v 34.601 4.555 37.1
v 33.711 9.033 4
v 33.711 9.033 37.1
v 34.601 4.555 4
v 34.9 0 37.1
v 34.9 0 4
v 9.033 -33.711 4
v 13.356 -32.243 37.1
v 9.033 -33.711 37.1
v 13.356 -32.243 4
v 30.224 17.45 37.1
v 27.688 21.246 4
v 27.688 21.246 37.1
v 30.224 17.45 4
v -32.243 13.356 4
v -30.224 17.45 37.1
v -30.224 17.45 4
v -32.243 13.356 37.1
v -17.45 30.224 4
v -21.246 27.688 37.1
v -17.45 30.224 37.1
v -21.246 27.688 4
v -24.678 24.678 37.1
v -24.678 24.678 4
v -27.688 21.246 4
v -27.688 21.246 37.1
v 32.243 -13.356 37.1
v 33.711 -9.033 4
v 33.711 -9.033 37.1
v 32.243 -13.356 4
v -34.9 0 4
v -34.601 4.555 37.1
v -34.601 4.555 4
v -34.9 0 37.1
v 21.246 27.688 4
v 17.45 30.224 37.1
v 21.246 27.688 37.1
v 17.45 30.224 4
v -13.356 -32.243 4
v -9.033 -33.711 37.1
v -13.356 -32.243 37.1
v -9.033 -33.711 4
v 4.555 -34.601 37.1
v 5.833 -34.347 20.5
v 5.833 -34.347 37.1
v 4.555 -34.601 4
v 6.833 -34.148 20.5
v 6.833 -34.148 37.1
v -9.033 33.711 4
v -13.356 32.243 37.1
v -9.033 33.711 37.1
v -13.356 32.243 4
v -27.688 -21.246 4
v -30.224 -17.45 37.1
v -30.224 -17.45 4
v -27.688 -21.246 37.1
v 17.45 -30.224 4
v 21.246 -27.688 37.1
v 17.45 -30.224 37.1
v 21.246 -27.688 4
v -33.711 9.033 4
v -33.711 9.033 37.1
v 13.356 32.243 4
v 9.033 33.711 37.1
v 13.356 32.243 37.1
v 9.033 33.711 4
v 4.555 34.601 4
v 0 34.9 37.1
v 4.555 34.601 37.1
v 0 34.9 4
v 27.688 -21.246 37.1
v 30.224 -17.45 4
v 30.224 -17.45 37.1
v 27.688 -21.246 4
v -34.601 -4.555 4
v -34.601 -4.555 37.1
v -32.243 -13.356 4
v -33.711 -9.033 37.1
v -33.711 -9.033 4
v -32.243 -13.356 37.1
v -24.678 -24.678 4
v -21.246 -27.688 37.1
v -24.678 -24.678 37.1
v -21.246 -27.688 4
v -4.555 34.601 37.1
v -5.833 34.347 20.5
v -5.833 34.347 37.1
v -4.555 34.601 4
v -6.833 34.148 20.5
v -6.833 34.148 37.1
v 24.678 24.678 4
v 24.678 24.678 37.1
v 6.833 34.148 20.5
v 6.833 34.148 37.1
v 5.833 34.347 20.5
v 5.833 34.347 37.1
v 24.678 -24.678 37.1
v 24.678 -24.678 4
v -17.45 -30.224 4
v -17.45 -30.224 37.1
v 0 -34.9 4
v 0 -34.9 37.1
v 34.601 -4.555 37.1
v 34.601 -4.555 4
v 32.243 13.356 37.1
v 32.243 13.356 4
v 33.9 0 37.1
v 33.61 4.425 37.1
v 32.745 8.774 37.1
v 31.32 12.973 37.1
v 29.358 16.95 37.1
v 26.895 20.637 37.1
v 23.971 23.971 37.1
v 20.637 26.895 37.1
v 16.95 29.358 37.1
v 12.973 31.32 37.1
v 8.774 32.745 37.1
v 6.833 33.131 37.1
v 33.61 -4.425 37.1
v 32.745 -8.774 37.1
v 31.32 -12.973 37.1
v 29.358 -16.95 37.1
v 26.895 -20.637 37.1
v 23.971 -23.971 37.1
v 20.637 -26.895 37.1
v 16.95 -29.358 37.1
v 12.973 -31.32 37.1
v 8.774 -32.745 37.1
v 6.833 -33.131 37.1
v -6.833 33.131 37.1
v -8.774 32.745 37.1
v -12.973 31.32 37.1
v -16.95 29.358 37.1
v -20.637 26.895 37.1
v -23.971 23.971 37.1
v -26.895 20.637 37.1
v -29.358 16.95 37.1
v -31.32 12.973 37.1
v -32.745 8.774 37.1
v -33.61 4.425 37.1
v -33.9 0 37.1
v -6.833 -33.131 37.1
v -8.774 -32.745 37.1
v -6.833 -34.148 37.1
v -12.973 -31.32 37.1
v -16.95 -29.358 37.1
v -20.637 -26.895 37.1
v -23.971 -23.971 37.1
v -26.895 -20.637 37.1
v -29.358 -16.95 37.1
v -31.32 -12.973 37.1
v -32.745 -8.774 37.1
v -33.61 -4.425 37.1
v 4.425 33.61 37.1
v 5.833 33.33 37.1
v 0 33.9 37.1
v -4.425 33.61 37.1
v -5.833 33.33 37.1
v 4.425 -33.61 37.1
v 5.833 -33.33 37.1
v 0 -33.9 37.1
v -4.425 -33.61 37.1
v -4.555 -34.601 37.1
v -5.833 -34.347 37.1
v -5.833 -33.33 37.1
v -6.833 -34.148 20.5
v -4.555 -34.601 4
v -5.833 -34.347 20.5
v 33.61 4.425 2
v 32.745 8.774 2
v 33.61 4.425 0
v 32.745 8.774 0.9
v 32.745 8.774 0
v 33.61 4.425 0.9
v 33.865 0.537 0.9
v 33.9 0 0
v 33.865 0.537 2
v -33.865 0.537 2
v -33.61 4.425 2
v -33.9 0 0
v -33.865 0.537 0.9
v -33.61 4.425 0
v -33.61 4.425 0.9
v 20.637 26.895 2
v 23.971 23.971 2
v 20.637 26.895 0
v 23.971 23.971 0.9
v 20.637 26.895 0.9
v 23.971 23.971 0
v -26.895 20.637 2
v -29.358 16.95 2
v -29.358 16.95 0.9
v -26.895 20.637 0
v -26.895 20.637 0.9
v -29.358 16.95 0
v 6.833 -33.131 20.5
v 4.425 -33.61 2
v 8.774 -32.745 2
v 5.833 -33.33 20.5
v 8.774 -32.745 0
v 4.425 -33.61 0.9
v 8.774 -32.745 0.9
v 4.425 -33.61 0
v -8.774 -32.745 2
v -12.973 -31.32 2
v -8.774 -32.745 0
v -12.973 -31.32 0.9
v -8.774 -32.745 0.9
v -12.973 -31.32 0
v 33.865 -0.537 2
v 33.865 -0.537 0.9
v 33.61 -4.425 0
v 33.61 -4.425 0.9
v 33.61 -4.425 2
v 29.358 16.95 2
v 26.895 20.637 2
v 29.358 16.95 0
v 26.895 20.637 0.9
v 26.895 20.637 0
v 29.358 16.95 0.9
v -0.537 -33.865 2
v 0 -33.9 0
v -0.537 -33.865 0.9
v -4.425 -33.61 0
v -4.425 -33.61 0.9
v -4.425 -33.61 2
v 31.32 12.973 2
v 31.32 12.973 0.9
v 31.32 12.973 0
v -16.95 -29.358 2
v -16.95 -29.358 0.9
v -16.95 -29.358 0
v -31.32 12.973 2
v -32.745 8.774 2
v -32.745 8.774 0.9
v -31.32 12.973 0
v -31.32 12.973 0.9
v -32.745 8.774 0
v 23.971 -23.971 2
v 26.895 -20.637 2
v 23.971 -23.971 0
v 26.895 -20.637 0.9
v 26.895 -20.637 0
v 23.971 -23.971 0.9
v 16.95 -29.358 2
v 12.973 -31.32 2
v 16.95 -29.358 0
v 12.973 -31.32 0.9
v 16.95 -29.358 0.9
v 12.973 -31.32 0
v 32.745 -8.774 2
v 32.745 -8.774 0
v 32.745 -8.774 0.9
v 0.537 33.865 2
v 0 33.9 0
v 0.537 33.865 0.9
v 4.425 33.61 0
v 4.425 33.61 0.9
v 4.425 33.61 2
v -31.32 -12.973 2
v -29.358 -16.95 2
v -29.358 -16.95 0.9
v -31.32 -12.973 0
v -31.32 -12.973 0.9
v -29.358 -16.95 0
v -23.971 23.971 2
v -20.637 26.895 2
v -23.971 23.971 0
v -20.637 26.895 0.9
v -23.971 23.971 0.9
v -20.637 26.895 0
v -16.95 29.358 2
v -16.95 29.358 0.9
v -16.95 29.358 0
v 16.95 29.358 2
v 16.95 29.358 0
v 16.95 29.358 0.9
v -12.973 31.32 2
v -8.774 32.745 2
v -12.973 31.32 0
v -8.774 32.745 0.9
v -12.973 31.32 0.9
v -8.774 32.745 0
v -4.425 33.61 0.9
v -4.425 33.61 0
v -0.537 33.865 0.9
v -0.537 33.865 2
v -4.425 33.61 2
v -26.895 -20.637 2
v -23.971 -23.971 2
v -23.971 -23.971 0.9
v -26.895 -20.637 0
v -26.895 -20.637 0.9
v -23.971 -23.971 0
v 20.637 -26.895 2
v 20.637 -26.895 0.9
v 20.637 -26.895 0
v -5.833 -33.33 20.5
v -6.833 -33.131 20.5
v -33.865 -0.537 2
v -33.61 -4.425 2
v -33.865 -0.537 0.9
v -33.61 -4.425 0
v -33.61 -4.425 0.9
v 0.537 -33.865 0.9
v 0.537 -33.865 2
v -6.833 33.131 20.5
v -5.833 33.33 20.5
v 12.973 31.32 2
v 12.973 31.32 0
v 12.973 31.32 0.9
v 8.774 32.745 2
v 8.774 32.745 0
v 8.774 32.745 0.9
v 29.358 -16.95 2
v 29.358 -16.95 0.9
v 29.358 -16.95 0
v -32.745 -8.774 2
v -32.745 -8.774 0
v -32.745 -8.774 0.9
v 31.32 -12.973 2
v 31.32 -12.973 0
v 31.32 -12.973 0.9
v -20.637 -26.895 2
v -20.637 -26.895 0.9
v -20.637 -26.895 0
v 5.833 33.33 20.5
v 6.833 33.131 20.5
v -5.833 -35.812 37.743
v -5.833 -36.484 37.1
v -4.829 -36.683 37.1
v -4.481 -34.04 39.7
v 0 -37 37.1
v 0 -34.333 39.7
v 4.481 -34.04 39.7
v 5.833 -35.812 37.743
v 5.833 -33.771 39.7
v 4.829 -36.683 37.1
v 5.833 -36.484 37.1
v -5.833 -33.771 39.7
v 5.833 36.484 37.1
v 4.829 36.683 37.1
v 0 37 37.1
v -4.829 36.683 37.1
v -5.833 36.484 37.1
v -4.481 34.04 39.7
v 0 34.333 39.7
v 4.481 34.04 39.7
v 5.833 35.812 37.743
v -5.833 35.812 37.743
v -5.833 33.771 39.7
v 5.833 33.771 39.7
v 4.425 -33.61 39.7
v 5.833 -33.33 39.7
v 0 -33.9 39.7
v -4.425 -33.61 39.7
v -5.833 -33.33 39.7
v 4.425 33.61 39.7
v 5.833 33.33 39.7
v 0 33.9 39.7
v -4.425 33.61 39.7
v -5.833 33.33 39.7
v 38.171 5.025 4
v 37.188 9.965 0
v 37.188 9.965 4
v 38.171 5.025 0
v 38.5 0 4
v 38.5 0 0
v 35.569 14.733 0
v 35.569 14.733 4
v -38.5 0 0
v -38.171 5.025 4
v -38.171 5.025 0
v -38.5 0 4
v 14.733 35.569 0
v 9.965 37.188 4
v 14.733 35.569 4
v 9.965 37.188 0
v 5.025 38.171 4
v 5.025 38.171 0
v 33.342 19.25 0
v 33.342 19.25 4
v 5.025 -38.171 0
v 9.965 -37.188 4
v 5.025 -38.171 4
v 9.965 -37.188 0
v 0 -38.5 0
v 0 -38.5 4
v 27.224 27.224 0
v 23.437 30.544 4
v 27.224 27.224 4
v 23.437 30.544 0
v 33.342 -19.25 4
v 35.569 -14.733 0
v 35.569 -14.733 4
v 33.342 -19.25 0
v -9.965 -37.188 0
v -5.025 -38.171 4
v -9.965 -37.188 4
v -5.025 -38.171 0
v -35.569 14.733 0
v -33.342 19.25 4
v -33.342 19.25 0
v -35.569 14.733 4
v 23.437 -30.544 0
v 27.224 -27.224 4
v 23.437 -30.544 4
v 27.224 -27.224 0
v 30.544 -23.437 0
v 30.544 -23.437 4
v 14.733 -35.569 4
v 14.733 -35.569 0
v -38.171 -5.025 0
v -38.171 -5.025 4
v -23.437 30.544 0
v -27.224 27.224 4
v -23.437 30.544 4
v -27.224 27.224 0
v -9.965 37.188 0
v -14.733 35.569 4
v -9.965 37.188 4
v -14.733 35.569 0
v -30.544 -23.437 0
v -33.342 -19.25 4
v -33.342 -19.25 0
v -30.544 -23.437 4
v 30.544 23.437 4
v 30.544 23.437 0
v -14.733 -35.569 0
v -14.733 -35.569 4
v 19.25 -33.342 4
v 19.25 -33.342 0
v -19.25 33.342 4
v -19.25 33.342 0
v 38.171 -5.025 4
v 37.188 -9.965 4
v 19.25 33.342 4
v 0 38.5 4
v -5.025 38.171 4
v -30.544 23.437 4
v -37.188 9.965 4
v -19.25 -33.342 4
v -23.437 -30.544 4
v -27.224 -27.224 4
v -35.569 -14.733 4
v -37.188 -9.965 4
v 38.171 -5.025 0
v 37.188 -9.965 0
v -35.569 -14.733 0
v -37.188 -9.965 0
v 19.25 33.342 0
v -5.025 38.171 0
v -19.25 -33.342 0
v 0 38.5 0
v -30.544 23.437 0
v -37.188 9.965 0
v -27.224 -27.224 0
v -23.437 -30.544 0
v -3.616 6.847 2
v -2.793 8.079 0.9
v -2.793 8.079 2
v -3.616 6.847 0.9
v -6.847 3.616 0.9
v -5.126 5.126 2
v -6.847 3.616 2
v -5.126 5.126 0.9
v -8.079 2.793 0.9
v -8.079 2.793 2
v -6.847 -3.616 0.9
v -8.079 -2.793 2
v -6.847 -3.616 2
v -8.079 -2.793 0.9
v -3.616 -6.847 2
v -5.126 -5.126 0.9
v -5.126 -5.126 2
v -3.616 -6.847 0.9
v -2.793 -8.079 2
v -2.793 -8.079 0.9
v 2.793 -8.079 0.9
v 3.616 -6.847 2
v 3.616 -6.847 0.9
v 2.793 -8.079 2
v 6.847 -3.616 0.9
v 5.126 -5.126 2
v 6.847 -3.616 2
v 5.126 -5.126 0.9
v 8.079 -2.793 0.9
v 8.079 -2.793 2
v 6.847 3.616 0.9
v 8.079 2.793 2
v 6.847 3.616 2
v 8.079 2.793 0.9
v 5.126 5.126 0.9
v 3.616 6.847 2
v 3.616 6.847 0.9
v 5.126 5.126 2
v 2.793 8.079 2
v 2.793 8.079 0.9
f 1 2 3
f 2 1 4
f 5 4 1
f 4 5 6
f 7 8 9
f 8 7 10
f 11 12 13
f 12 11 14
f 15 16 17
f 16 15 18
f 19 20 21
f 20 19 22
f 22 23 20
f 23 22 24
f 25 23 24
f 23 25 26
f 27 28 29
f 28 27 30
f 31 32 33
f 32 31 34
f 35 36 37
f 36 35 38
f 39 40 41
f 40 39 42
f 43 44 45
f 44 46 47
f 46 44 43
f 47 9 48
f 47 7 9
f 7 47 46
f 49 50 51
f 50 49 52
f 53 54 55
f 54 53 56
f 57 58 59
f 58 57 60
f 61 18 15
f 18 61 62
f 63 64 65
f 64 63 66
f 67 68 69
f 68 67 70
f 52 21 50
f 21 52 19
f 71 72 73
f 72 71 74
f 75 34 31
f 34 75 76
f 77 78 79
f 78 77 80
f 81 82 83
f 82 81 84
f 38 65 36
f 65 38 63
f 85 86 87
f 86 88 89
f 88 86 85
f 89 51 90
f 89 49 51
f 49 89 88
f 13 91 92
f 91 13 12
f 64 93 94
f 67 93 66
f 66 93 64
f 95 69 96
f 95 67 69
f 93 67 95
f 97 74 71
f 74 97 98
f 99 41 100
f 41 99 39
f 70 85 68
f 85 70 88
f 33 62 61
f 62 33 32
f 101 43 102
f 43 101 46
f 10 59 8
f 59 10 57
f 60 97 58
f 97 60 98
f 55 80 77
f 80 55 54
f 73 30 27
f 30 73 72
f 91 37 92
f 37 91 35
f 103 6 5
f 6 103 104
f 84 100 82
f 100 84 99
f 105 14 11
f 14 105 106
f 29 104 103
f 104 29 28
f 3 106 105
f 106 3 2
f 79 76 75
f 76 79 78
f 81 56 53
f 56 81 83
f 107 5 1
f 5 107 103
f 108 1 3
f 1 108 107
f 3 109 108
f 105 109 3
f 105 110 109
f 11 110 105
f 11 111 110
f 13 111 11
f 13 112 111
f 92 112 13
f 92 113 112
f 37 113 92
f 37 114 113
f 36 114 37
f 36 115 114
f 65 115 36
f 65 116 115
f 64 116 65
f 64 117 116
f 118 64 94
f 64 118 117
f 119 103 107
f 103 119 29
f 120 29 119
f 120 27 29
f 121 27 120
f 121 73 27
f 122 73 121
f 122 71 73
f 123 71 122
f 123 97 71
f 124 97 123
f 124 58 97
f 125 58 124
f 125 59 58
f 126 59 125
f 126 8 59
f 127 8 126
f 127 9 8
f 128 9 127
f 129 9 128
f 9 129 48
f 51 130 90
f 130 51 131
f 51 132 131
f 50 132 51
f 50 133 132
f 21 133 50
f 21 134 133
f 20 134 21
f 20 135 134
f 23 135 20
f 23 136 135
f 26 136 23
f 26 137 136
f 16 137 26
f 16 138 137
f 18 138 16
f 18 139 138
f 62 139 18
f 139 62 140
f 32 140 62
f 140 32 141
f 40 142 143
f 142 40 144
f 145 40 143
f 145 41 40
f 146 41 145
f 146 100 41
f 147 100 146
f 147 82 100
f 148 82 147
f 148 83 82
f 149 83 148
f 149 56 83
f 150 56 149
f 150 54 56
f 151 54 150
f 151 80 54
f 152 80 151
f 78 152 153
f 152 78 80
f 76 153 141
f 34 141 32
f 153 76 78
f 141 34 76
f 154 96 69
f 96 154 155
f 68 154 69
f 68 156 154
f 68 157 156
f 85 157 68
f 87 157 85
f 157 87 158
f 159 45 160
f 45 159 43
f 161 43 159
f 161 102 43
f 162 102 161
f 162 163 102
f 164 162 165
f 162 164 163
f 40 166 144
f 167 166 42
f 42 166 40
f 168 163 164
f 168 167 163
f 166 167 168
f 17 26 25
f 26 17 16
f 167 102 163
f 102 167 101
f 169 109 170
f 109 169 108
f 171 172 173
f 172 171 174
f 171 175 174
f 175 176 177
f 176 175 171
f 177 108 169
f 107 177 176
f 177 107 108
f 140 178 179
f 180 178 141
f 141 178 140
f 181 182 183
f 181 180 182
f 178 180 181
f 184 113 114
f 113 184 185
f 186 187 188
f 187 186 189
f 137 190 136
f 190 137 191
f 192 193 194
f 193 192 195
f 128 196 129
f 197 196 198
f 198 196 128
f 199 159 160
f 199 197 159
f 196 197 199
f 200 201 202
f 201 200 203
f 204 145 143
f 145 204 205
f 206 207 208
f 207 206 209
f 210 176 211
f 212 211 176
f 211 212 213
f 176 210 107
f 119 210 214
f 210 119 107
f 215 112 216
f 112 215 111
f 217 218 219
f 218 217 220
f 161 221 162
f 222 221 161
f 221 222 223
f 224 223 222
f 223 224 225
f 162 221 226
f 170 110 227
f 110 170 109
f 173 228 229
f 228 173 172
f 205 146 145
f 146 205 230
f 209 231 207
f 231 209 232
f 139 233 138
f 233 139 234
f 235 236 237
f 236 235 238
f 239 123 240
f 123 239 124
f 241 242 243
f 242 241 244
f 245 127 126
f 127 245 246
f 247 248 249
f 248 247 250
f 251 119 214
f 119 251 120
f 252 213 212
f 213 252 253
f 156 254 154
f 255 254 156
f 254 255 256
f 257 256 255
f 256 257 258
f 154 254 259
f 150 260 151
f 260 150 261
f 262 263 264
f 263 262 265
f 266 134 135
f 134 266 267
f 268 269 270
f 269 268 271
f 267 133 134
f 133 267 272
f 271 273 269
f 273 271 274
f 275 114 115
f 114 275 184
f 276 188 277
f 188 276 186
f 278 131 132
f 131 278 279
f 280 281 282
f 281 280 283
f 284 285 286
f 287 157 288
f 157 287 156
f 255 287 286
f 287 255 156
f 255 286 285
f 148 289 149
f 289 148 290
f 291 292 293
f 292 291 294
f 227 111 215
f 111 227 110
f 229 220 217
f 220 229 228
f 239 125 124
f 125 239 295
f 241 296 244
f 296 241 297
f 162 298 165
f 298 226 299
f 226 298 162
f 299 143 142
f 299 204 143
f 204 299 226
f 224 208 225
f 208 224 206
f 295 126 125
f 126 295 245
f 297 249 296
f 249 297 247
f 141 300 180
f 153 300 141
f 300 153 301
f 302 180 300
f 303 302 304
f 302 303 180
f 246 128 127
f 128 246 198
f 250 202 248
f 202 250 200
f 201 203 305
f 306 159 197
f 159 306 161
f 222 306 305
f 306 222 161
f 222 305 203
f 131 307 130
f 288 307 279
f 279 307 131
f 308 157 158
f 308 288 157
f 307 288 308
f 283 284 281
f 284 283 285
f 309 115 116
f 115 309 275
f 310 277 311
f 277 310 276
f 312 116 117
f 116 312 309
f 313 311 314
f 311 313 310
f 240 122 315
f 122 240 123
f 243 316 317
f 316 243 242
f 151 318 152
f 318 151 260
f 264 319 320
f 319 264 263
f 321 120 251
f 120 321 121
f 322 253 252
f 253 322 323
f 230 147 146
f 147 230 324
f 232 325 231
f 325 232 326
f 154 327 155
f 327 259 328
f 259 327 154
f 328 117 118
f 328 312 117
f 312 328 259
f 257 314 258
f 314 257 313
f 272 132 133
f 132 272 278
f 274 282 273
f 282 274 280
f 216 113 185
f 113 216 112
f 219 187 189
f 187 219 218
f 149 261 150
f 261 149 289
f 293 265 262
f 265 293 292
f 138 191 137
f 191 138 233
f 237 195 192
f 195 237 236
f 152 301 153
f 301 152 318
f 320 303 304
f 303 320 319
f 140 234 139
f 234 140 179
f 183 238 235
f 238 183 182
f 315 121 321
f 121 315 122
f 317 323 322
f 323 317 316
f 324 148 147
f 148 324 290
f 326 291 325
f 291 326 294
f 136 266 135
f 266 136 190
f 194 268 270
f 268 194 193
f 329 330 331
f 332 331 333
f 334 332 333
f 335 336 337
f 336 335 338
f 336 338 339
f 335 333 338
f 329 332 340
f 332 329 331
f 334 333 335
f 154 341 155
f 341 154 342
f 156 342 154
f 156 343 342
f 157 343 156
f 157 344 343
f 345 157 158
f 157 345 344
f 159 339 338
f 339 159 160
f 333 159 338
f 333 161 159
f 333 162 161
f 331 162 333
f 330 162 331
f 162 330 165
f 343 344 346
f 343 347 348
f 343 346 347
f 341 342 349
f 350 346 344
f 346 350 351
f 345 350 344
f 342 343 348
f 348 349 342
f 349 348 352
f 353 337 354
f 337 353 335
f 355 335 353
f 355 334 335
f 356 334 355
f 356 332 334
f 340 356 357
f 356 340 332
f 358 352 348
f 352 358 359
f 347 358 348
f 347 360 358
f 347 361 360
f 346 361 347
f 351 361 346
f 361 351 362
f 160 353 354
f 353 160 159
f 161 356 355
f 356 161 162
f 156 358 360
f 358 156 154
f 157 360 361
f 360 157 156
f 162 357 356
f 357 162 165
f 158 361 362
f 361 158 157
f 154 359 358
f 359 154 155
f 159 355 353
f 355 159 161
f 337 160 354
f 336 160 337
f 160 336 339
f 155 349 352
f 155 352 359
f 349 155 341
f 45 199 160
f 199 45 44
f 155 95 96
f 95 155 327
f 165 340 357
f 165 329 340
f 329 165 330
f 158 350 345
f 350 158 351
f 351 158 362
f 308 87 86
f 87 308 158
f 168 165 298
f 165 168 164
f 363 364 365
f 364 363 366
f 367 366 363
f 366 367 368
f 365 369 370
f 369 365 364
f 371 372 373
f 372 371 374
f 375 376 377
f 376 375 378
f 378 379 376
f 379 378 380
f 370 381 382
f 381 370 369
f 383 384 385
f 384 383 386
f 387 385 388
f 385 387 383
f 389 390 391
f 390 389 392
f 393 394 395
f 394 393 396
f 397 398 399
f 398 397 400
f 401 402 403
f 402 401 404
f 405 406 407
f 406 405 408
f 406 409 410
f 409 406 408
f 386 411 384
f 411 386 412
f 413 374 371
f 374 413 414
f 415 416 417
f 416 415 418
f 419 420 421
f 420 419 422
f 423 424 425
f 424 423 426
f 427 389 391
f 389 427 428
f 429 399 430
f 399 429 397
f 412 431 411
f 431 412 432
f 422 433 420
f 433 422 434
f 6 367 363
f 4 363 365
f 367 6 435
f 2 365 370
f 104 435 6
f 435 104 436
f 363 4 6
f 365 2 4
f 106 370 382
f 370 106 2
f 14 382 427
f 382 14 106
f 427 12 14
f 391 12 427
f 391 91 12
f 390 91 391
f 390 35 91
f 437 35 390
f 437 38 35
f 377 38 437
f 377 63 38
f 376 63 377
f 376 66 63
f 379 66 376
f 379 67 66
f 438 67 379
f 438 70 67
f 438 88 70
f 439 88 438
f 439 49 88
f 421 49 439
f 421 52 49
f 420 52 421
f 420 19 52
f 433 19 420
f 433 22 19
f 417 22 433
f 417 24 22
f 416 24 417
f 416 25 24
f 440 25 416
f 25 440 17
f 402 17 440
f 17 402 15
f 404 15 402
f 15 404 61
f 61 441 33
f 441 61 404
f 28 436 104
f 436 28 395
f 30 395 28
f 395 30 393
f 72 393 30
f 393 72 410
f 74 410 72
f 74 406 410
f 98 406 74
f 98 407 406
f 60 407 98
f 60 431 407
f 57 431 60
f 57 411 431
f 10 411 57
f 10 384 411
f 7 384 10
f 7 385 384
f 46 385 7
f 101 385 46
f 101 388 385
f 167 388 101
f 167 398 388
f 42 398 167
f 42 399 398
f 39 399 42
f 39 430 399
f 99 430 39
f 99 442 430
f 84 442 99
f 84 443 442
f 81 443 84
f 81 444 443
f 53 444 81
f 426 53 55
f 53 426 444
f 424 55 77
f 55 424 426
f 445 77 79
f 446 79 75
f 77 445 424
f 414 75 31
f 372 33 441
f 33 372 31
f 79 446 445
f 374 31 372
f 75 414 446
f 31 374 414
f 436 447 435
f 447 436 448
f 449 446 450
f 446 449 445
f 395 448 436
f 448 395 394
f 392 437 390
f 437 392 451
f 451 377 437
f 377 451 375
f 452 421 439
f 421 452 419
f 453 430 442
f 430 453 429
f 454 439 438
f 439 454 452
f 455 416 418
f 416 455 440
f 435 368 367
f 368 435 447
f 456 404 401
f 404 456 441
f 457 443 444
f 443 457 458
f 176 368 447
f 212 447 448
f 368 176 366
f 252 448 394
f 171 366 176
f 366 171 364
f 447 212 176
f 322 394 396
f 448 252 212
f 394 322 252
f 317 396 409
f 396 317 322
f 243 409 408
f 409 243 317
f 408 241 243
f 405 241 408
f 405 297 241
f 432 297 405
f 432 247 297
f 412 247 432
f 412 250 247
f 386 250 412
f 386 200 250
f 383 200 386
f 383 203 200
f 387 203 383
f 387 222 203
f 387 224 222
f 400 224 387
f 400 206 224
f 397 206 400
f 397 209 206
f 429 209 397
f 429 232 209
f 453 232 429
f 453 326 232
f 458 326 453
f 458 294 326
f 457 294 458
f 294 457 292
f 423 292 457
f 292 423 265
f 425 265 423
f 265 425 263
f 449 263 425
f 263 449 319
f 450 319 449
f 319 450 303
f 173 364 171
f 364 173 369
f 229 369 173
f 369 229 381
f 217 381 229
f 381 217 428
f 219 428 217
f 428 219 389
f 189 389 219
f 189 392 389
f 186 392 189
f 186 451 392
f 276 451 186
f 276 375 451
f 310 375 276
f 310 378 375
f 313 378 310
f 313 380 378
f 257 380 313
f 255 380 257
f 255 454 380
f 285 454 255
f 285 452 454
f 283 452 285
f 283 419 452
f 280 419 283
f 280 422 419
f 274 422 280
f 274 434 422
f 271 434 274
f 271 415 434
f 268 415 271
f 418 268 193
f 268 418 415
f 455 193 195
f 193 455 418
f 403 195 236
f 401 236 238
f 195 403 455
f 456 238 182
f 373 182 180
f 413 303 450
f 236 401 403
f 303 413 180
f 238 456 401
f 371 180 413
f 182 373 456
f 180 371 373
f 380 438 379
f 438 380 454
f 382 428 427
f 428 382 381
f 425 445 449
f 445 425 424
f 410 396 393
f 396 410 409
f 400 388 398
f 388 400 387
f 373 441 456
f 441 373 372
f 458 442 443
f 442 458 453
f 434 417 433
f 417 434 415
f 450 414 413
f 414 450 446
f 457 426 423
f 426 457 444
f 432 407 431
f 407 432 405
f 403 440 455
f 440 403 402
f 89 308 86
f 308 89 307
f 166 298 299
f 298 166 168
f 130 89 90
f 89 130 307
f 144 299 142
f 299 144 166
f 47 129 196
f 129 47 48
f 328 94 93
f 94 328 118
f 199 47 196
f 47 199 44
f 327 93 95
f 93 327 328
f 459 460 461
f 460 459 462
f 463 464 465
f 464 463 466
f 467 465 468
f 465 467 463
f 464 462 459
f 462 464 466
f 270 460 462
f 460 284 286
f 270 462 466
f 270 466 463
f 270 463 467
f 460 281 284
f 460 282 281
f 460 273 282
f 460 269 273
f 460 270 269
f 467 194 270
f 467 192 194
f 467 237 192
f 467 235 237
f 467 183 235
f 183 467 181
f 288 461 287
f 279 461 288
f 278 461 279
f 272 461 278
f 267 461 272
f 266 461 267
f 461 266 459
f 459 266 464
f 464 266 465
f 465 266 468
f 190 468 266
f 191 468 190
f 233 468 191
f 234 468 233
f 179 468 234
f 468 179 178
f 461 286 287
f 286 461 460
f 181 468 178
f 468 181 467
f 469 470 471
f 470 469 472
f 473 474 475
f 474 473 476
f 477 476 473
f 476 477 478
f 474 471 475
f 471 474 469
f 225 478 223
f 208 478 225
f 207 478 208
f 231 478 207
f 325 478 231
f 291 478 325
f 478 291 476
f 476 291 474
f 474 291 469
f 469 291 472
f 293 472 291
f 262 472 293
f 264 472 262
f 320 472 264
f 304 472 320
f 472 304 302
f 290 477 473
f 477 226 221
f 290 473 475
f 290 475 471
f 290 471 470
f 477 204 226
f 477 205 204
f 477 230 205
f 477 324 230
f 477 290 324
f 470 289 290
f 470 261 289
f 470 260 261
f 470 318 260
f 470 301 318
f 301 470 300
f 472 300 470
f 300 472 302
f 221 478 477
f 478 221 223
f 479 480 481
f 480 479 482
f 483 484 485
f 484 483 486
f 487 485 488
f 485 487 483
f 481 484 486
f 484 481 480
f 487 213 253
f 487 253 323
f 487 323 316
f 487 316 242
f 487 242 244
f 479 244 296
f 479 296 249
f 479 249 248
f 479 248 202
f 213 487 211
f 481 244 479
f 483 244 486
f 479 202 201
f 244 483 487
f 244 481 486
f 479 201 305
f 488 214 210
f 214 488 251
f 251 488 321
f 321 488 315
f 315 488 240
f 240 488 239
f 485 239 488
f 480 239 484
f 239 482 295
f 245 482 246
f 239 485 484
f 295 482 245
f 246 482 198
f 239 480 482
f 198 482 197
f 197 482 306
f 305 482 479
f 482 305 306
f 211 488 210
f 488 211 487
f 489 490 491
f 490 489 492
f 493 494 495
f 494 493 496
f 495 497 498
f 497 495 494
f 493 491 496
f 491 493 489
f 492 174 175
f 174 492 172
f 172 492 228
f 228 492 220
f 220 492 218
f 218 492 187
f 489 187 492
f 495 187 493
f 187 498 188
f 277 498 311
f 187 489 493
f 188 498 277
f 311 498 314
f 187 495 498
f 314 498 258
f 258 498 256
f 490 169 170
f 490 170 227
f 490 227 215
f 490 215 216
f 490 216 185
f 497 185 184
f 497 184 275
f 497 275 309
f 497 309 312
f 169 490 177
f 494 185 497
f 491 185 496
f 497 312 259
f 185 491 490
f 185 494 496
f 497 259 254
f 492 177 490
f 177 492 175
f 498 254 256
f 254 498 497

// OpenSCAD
$fn=48;


module cyl(height, radius, thickness) {
    difference() {
        cylinder(height, r=radius);
        translate([0,0,-height*0.1]) 
            cylinder(height * 1.2, r=radius-thickness/2);
    }
}


h = 33;
r = 35;
t = 2;
c = 0.1;



module hontai() {
    translate([0, 0, t*2])
    difference() {
        union() {
            translate([0, 0, -c]) cyl(h+c*2, r-c, t);
            translate([0, 0, -t*2]) cylinder(t*2, r=r*1.1);
            intersection() {
                translate([0, 0, h+c]) 
                    difference() {
                        cylinder(t*1.3, r+t, r-t/3);
                        translate([0,0,-c]) cylinder(t*3, r=r-t/2-c);
                    }
                translate([-r/3/2, -r*2, 0]) cube([r/3, r*4, h*2]);
            }
        }
        union() {
            translate([-(r/3/2+t/2), -r*2, h*.5]) cube([t/2, r*4, h*2]);
            translate([(r/3/2), -r*2, h*.5]) cube([t/2, r*4, h*2]);
            translate([0, 0, -t*2-c]) cylinder(t*3, r=r-t/2-c);
        }
    }
}


hontai();

module leaf() {
    difference() {
        intersection() {
            translate([0, 0, t/2-c]) cylinder(t/2+c, r=r-t/2);
            union() {
                translate([r/2, r/2, 0]) cylinder(5, r=r/2);
                translate([0, r/2, 0]) cube([r, r, 5]);
                translate([r/2, 0, 0]) cube([r, r, 5]);
            }
        }
        union() {
            translate([0, r*.1, 0]) rotate([0, 0, -5]) translate([0, -r, 0]) cube([r*2, r, 10]);
            translate([r*.1, 0, 0]) rotate([0, 0, 5]) translate([-r, 0, 0]) cube([r, r*2, 10]);
        }
    }
}

rotate([0, 0, 90]) leaf();
rotate([0, 0, 180]) leaf();
rotate([0, 0, 270]) leaf();
rotate([0, 0, 0]) leaf();
